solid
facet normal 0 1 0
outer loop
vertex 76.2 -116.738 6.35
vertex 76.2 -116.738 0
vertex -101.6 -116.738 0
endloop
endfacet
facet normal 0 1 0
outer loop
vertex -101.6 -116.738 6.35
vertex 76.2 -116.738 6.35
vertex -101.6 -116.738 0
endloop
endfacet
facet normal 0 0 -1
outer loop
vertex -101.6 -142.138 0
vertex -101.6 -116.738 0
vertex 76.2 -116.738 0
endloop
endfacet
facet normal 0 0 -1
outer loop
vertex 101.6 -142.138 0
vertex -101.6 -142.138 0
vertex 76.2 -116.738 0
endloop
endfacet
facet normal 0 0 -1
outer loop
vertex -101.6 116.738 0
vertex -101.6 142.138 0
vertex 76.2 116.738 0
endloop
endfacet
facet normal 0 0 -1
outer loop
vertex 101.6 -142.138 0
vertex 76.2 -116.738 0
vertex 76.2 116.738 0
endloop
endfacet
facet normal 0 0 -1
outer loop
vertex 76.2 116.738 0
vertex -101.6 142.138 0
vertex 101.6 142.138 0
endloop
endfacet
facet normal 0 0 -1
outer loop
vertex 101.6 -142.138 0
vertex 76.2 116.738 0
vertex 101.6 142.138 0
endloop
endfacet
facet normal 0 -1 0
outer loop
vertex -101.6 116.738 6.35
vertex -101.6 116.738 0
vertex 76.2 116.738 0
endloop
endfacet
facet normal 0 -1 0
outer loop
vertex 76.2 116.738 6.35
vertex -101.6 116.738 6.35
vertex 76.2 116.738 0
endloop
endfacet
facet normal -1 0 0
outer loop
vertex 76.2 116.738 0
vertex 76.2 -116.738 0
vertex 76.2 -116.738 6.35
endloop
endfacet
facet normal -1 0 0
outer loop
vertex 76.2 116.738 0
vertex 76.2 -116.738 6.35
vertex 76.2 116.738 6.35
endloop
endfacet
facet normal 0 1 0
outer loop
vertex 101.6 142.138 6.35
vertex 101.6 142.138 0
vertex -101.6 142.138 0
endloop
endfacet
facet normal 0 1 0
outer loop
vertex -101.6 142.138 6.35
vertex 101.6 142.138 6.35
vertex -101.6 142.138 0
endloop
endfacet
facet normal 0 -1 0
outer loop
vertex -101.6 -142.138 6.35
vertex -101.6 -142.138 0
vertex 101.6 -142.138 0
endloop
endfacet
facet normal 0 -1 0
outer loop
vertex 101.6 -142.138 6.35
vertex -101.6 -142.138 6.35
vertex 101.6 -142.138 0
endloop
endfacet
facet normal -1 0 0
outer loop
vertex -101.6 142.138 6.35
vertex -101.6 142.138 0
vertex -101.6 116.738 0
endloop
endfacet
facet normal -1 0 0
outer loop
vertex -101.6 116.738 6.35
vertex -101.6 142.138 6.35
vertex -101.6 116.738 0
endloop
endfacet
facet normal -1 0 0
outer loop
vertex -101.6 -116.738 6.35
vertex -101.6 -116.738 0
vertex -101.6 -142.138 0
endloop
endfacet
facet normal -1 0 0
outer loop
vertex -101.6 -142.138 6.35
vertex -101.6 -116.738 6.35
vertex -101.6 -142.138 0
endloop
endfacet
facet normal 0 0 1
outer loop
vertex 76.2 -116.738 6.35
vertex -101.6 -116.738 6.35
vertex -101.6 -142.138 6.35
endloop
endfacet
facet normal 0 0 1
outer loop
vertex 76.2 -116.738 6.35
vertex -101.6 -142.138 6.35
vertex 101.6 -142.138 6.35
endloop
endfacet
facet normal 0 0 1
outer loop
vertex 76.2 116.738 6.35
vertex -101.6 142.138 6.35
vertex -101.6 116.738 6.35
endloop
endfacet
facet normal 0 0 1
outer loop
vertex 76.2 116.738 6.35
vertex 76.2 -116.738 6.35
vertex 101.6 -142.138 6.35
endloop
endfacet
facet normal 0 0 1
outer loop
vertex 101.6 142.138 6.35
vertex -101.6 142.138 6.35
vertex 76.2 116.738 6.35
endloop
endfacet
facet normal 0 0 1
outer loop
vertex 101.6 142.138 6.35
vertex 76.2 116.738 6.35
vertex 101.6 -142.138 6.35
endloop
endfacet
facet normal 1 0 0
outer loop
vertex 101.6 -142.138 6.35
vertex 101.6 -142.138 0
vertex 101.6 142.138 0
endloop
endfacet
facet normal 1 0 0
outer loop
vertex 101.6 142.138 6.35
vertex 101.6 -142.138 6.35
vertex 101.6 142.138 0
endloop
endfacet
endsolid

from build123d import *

# Parameters (mm, degrees)
F0_W     = 12.7
F0_H     = 233.4768
F1_DEPTH = 6.35


# Not quite as in the source:
# - a feature names something its author has since deleted; it is built from what else it names


with BuildPart() as f1:
    # F0 (on Top) → F1 (new body)
    with BuildSketch(Plane.XY):
        Polygon((88.9, -116.7384), (76.2, -116.7384), (-76.2, -116.7384), (-101.6, -116.7384), (-101.6, -142.1384), (101.6, -142.1384), (101.6, -116.7384), align=None)
        Polygon((-76.2, 116.7384), (76.2, 116.7384), (88.9, 116.7384), (101.6, 116.7384), (101.6, 142.1384), (-101.6, 142.1384), (-101.6, 116.7384), align=None)
        with Locations((95.25, 0)):
            Rectangle(F0_W, F0_H)
        with Locations((82.55, 0)):
            Rectangle(F0_W, F0_H)
    extrude(amount=F1_DEPTH)


solid = f1.part
